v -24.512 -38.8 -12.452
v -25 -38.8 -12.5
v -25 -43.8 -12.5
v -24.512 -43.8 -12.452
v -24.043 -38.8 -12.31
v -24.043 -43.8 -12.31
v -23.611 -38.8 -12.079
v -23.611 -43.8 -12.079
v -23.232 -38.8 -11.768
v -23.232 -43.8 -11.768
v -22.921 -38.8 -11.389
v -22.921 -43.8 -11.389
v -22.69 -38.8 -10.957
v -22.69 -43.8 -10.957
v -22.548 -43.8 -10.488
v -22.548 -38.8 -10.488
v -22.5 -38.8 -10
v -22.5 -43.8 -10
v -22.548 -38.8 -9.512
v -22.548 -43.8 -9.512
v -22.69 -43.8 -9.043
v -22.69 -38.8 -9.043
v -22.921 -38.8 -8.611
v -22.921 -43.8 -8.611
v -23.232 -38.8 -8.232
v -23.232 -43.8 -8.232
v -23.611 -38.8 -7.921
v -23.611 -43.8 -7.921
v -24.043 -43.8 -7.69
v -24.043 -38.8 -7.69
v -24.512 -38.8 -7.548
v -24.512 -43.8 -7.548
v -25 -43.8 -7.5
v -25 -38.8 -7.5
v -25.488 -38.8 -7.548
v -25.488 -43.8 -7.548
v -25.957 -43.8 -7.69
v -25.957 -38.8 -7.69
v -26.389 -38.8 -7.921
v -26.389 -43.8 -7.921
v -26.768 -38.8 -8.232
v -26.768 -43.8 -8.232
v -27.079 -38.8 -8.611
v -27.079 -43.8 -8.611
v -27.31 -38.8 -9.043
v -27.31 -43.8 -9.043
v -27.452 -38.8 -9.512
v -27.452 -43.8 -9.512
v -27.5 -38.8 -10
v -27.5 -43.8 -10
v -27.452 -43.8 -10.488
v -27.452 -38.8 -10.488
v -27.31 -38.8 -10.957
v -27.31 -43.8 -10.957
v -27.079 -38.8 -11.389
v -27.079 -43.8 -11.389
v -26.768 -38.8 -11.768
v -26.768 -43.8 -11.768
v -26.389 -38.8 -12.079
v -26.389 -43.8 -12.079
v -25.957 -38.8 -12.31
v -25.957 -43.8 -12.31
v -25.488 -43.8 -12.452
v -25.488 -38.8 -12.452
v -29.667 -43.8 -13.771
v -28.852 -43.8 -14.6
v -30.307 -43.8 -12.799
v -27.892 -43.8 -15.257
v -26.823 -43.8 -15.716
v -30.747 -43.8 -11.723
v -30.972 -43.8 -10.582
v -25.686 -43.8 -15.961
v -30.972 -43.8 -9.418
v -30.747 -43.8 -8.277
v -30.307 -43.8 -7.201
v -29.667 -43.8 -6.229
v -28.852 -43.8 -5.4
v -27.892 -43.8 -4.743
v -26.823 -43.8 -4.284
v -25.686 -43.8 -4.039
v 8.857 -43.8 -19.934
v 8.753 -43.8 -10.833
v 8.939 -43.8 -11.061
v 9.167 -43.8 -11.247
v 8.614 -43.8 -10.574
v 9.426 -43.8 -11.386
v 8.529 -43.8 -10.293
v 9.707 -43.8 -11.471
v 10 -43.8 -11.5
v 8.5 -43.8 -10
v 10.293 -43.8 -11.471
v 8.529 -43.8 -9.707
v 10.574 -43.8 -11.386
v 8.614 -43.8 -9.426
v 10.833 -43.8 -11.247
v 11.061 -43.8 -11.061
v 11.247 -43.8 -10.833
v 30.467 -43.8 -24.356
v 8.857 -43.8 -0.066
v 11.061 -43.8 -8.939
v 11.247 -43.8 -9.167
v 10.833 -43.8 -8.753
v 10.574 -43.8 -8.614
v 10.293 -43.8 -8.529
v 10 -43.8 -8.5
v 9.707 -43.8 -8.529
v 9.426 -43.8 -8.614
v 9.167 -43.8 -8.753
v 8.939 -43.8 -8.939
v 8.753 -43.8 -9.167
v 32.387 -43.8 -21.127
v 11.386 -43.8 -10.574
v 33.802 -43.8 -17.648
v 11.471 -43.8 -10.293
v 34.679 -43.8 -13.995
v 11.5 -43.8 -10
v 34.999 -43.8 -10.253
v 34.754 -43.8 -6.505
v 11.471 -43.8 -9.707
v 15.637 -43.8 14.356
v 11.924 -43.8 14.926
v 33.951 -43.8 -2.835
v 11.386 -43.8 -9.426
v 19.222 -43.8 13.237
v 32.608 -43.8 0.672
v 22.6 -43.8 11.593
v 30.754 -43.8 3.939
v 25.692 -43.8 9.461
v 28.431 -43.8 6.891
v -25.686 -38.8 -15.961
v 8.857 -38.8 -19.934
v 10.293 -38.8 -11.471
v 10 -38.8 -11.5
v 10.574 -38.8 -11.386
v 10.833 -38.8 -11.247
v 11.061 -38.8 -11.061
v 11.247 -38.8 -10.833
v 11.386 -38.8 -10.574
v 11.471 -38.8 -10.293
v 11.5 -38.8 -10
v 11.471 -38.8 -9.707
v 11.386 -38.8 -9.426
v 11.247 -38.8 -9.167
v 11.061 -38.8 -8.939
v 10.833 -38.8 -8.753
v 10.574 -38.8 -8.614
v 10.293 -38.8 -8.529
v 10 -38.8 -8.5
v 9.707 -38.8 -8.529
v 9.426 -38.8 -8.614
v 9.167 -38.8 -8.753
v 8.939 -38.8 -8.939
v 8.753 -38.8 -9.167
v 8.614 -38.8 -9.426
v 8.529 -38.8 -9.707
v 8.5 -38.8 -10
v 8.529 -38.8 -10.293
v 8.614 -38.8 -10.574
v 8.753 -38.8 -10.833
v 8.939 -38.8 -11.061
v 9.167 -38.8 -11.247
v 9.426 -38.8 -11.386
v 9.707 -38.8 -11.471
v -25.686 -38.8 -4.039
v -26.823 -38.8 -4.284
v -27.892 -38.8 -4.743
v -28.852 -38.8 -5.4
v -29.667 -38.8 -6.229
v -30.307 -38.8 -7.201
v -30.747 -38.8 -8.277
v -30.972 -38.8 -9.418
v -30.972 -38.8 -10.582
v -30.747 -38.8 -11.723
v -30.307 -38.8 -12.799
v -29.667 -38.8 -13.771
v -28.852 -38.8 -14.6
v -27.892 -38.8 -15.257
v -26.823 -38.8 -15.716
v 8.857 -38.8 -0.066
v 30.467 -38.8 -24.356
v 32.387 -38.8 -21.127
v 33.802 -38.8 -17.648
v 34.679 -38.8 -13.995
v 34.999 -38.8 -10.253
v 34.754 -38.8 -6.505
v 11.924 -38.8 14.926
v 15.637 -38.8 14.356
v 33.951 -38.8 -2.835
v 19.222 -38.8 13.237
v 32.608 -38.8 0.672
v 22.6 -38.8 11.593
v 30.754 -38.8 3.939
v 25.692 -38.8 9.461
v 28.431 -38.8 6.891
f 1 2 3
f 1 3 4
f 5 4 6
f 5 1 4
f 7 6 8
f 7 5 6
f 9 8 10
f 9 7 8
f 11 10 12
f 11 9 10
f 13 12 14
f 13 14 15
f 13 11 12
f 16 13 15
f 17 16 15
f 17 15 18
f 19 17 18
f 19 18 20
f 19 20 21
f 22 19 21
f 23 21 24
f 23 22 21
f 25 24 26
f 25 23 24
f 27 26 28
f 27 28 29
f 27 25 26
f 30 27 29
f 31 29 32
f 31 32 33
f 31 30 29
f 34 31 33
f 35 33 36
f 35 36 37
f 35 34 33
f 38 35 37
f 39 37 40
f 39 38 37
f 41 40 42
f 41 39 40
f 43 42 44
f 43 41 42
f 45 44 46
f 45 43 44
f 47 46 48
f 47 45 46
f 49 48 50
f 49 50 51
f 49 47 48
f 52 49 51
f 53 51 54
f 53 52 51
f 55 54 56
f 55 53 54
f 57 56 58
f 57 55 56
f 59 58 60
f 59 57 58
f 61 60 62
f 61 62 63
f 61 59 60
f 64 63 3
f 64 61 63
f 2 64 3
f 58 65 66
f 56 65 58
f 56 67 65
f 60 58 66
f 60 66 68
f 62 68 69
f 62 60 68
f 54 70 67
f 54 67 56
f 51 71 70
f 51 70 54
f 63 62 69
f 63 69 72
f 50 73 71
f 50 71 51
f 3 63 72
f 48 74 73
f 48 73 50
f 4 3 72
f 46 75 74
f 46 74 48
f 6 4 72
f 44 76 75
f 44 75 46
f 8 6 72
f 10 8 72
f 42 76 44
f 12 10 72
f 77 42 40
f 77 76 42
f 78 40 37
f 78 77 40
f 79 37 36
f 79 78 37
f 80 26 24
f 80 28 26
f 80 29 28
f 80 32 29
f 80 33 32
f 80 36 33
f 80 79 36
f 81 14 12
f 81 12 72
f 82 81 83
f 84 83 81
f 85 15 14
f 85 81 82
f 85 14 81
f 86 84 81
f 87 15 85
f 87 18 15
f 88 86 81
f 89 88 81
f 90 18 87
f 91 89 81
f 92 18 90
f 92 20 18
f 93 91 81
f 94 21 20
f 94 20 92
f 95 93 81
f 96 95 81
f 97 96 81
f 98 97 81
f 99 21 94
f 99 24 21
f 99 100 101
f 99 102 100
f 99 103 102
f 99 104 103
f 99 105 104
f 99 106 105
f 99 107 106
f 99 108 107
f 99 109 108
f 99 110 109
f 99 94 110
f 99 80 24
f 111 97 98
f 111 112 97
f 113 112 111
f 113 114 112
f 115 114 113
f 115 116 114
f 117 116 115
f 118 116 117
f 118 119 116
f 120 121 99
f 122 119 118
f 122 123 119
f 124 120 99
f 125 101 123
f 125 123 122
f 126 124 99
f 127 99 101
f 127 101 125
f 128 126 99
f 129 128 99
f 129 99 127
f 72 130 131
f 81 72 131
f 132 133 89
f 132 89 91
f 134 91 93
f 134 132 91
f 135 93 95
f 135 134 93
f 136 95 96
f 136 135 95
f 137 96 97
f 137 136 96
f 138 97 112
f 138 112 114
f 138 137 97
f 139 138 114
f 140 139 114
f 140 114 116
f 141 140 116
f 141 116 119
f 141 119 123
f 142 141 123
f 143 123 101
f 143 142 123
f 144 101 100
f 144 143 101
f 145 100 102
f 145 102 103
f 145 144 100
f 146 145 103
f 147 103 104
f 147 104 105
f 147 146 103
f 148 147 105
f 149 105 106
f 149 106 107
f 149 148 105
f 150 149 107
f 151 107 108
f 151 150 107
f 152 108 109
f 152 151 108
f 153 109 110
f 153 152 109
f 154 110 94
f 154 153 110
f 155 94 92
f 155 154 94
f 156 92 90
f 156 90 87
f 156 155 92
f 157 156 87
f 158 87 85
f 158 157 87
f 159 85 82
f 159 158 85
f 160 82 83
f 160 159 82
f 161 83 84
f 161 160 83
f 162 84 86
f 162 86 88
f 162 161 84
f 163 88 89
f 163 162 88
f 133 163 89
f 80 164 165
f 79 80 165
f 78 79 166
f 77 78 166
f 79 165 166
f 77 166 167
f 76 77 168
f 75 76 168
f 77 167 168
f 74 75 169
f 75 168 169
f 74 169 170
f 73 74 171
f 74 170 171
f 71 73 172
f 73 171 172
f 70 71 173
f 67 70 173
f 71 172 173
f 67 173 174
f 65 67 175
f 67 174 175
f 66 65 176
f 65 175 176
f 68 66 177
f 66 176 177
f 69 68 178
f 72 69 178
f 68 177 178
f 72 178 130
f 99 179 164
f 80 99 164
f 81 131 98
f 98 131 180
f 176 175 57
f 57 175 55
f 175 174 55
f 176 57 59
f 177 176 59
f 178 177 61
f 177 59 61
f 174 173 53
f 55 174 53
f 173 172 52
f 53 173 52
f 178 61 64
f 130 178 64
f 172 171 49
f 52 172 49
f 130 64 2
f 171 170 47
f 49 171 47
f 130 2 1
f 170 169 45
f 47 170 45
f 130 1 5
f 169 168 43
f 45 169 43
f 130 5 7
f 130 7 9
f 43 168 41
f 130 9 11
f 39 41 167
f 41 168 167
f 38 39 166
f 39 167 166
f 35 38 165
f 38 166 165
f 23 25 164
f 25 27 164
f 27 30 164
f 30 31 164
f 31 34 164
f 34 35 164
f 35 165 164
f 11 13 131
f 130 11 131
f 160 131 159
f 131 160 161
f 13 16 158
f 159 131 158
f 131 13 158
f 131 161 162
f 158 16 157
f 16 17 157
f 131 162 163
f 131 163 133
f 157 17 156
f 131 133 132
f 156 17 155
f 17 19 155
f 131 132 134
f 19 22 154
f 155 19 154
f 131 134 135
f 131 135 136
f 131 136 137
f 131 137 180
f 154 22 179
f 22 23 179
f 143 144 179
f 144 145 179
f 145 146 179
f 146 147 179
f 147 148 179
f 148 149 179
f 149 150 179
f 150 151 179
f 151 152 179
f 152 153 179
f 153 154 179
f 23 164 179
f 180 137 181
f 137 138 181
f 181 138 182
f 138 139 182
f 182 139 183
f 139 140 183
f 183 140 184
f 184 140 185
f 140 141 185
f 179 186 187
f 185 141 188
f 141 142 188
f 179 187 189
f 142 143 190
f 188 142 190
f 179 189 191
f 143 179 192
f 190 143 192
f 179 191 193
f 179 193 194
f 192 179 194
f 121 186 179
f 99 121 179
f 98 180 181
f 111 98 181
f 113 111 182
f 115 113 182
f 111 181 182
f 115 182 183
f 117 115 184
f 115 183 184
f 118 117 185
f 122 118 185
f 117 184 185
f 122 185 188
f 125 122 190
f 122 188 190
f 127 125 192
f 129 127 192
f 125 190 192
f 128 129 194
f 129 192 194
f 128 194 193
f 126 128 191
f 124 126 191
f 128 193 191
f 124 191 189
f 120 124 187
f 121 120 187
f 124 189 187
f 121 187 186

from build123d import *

# Parameters (mm, degrees)
ESQUISSE2_R        = 1.5
ESQUISSE2_R_2      = 2.5
BOSS_EXTRU_1_DEPTH = 5


with BuildPart() as part:
    # Esquisse2 → Boss.-Extru.1 (new body)
    with BuildSketch(Plane.XZ.offset(38.8)):
        with BuildLine():
            Line((8.857142857, -0.065520771), (-25.685714286, -4.039312463))
            ThreePointArc((-25.685714286, -4.039312463), (-31, -10), (-25.685714286, -15.960687537))
            Line((-25.685714286, -15.960687537), (8.857142857, -19.934479229))
            Line((8.857142857, -19.934479229), (30.467410963, -24.355663986))
            ThreePointArc((30.467410963, -24.355663986), (32.607632, 0.67215889), (11.924183808, 14.92584034))
            Line((11.924183808, 14.92584034), (8.857142857, -0.065520771))
        make_face()
        with Locations(Location((10, -10, 0), (0, 0, 270))):
            Circle(ESQUISSE2_R, mode=Mode.SUBTRACT)
        with Locations(Location((-25, -10, 0), (0, 0, 270))):
            Circle(ESQUISSE2_R_2, mode=Mode.SUBTRACT)
    extrude(amount=BOSS_EXTRU_1_DEPTH)


solid = part.part
